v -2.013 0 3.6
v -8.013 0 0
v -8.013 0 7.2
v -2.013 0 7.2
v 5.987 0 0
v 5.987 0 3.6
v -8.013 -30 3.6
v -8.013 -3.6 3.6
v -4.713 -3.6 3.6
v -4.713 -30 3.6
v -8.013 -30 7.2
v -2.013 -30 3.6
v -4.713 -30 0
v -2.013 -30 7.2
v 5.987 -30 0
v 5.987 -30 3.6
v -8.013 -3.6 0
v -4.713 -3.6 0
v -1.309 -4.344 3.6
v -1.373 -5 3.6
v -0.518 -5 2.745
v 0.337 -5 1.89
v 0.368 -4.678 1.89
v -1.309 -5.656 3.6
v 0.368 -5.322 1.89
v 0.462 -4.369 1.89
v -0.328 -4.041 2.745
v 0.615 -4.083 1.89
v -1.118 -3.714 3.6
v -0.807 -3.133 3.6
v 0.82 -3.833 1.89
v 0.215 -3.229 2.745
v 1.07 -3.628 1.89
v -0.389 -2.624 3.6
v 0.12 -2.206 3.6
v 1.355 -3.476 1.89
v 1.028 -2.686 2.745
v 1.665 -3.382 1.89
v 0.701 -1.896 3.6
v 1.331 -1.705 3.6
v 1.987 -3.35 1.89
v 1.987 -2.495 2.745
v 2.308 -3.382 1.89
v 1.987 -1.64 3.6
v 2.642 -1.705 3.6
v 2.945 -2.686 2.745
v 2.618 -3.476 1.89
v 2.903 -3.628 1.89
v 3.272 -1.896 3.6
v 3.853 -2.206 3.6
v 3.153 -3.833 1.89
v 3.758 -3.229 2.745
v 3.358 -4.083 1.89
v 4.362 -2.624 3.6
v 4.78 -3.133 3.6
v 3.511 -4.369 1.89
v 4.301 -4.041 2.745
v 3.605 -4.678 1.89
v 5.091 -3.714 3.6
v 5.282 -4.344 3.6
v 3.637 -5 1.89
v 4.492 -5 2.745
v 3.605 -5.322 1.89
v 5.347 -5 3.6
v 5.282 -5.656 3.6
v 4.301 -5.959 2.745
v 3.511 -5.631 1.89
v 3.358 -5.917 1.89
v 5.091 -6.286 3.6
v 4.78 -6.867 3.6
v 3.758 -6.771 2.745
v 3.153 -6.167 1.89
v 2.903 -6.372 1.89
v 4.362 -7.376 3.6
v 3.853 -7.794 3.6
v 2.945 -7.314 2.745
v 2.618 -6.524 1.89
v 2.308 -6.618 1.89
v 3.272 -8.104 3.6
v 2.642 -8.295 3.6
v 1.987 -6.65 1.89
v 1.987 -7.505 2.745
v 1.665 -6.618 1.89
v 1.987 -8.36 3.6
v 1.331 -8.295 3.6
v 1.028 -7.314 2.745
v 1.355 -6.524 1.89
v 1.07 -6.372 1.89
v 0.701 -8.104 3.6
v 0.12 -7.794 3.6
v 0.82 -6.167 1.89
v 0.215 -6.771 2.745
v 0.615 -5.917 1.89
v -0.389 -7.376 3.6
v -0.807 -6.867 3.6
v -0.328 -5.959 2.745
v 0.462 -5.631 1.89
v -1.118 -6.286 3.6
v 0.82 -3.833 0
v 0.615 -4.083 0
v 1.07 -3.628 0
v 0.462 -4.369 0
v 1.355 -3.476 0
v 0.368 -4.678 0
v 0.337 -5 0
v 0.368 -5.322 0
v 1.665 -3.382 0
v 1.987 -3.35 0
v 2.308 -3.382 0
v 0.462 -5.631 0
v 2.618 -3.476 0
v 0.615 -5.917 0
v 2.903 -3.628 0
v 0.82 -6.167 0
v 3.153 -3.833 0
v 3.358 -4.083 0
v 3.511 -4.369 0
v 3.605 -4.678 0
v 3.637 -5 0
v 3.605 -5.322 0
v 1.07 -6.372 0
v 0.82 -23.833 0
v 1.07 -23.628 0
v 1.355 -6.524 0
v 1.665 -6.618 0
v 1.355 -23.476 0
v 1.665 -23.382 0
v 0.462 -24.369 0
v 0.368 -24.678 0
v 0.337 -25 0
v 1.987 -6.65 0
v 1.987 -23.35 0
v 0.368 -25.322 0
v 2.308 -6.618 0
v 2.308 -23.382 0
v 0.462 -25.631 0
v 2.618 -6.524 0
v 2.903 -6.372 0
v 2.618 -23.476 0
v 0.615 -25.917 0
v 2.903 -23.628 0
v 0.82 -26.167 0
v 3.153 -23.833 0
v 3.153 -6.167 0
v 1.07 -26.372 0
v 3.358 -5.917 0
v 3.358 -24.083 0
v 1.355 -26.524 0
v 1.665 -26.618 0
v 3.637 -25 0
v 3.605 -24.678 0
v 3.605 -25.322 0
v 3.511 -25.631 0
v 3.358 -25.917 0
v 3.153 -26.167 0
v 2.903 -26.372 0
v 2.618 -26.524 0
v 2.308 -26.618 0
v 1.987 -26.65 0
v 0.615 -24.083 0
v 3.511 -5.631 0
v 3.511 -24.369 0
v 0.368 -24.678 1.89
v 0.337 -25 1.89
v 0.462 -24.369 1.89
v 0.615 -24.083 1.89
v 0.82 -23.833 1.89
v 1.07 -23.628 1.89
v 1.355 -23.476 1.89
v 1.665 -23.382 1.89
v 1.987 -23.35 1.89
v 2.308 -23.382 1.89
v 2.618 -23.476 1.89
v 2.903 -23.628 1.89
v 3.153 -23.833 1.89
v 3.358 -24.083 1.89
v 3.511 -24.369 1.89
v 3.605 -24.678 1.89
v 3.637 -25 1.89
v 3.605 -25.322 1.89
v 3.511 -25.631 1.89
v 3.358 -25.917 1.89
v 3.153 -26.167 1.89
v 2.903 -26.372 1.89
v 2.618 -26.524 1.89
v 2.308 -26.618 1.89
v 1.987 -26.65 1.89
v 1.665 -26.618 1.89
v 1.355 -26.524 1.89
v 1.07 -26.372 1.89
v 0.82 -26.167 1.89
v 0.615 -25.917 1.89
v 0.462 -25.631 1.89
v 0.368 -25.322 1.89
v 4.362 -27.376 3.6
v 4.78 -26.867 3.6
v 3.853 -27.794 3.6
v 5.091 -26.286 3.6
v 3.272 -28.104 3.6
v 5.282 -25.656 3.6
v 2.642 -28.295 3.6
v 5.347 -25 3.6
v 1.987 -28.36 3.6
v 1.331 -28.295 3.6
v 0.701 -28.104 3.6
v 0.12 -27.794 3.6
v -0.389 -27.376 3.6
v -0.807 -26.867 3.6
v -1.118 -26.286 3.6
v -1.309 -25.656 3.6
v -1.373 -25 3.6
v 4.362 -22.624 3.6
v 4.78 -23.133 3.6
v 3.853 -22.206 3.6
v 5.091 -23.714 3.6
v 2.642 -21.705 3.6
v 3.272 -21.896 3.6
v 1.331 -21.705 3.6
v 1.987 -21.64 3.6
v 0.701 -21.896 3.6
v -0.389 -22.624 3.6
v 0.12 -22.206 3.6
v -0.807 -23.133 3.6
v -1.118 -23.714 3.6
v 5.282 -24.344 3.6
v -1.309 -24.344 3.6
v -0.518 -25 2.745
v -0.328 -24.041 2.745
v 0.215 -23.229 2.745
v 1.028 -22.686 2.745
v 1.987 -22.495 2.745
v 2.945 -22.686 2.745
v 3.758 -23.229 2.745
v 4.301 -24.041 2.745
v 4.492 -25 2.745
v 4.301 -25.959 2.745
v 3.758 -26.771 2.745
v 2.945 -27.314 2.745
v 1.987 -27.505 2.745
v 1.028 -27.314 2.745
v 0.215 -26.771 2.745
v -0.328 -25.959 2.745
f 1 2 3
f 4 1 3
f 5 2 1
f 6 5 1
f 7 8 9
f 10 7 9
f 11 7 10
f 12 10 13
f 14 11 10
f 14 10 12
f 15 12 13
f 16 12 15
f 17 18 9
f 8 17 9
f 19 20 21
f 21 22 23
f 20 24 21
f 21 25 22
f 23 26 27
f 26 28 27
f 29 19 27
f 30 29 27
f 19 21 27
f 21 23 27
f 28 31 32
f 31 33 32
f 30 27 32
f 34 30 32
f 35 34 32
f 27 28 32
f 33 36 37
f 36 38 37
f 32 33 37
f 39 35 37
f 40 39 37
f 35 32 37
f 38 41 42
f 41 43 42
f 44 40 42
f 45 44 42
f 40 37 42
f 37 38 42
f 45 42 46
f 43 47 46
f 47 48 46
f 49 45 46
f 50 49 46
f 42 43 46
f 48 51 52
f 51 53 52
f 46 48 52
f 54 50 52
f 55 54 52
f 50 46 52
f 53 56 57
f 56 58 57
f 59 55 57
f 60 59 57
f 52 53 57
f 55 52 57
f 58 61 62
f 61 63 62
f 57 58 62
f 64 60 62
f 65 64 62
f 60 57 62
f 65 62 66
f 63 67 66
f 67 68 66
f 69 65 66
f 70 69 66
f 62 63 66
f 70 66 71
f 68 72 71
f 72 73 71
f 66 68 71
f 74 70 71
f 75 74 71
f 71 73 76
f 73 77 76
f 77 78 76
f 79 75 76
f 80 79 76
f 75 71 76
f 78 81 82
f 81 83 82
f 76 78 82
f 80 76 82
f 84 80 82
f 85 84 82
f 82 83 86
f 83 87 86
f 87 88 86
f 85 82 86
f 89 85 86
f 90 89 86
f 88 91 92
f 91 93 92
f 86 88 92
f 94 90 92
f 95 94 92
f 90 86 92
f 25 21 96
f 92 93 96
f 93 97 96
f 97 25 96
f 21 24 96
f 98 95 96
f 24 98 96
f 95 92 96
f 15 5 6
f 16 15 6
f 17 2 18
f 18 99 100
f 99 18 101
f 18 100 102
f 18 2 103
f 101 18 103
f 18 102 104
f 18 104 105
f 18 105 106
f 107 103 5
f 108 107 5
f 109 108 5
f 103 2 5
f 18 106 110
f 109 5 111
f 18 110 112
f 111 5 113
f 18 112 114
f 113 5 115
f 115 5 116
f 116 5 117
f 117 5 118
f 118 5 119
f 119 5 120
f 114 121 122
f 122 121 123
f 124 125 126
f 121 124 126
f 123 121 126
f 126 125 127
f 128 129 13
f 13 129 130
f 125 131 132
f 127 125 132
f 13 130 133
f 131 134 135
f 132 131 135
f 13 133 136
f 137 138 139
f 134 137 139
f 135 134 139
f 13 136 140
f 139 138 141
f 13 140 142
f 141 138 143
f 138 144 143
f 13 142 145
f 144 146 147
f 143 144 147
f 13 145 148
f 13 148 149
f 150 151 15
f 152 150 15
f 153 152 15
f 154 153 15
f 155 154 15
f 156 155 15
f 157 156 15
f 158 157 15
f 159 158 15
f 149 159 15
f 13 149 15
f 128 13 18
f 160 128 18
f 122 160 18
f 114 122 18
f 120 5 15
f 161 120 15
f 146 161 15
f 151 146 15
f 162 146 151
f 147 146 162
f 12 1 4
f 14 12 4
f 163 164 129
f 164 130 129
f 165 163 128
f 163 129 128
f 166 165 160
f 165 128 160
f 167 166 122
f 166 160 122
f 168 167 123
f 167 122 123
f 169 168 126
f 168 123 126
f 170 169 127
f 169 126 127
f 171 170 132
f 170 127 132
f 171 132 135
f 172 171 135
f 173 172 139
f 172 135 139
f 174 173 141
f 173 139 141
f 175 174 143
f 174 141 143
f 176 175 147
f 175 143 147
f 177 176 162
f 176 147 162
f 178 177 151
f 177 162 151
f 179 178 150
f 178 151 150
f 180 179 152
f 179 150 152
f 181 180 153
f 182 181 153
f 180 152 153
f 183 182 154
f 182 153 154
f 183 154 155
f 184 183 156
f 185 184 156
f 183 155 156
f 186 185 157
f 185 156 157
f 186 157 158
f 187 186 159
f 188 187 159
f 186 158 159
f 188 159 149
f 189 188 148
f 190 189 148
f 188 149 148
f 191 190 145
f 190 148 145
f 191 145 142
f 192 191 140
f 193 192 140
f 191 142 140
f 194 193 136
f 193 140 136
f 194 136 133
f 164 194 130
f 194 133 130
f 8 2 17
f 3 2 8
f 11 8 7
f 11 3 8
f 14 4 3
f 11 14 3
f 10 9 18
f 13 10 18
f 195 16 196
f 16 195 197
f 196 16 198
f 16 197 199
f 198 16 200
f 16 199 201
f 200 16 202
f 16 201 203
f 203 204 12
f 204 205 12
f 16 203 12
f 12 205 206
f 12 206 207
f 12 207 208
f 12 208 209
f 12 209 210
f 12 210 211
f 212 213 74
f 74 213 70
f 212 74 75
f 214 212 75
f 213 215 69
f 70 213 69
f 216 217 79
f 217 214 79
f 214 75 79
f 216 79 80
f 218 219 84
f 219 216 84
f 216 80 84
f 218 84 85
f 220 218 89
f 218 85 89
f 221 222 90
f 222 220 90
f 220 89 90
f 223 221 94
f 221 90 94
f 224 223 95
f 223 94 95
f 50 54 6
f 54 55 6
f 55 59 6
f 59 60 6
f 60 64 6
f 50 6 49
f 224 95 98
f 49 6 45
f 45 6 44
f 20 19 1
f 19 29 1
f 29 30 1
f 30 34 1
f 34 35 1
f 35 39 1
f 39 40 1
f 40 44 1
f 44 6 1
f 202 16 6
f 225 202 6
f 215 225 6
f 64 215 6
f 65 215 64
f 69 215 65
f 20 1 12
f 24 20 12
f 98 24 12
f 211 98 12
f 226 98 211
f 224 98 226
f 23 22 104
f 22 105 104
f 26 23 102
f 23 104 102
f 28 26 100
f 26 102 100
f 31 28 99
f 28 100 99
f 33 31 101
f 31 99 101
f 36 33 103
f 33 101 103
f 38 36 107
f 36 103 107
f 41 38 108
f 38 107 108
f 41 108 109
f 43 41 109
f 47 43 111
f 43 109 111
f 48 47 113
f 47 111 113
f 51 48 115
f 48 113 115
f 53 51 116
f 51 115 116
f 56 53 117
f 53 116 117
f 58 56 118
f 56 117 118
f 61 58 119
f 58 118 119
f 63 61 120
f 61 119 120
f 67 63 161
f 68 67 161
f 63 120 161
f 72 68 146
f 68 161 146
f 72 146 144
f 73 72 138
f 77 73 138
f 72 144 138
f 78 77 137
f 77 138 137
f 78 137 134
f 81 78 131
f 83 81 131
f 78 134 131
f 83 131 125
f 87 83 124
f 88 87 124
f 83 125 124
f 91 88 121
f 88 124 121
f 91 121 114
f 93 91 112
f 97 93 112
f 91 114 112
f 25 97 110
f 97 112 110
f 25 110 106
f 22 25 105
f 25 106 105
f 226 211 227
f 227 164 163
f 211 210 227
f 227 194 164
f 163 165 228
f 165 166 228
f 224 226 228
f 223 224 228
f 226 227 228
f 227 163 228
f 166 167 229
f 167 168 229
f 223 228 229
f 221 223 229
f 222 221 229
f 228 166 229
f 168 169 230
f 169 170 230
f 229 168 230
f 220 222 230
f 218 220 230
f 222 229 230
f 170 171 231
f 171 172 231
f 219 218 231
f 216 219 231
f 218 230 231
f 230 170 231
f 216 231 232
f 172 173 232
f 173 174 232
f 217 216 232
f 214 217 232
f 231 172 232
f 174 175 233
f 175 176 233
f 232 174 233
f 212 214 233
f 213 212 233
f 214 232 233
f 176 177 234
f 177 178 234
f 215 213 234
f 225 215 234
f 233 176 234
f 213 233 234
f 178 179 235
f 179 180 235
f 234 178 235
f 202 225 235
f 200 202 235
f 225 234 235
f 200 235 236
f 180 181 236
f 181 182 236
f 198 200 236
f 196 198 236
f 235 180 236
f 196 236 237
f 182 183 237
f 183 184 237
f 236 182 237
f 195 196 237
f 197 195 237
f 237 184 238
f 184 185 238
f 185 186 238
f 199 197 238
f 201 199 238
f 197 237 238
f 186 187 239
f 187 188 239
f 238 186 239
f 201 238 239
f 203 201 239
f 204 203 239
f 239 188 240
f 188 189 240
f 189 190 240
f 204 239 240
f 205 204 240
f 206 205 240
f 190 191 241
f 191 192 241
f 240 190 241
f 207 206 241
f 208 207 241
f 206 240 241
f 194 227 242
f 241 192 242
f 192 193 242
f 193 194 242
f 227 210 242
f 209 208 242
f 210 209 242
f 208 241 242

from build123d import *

# Parameters (mm, degrees)
F1_DEPTH       = 30
F3_D           = 3.3
F3_CSINK_D     = 6.72
F3_CSINK_ANGLE = 90
F4_W           = 3.6
F4_H           = 3.6
F5_DEPTH       = 3.3


with BuildPart() as f1:
    # F0 (on Front) → F1 (new body)
    with BuildSketch(Plane.XZ):
        Polygon((-4.7134831967, 0), (5.9865168033, 0), (5.9865168033, 3.6), (-2.0134831967, 3.6), (-2.0134831967, 7.2), (-8.0134831967, 7.2), (-8.0134831967, 3.6), (-4.7134831967, 3.6), align=None)
    extrude(amount=F1_DEPTH)

    # F3 (through all)
    with Locations(Plane.XY.offset(3.6)):
        with Locations((1.9865168033, -5), (1.9865168033, -25)):
            CounterSinkHole(F3_D / 2, F3_CSINK_D / 2, counter_sink_angle=F3_CSINK_ANGLE)

    # F4 (on face) → F5 (join, through all)
    with BuildSketch(Plane(origin=(-4.7134831967, 0, 0), x_dir=(0, -1, 0), z_dir=(-1, 0, 0))):
        with Locations((1.8, 1.8)):
            Rectangle(F4_W, F4_H)
    extrude(amount=F5_DEPTH)


solid = f1.part
